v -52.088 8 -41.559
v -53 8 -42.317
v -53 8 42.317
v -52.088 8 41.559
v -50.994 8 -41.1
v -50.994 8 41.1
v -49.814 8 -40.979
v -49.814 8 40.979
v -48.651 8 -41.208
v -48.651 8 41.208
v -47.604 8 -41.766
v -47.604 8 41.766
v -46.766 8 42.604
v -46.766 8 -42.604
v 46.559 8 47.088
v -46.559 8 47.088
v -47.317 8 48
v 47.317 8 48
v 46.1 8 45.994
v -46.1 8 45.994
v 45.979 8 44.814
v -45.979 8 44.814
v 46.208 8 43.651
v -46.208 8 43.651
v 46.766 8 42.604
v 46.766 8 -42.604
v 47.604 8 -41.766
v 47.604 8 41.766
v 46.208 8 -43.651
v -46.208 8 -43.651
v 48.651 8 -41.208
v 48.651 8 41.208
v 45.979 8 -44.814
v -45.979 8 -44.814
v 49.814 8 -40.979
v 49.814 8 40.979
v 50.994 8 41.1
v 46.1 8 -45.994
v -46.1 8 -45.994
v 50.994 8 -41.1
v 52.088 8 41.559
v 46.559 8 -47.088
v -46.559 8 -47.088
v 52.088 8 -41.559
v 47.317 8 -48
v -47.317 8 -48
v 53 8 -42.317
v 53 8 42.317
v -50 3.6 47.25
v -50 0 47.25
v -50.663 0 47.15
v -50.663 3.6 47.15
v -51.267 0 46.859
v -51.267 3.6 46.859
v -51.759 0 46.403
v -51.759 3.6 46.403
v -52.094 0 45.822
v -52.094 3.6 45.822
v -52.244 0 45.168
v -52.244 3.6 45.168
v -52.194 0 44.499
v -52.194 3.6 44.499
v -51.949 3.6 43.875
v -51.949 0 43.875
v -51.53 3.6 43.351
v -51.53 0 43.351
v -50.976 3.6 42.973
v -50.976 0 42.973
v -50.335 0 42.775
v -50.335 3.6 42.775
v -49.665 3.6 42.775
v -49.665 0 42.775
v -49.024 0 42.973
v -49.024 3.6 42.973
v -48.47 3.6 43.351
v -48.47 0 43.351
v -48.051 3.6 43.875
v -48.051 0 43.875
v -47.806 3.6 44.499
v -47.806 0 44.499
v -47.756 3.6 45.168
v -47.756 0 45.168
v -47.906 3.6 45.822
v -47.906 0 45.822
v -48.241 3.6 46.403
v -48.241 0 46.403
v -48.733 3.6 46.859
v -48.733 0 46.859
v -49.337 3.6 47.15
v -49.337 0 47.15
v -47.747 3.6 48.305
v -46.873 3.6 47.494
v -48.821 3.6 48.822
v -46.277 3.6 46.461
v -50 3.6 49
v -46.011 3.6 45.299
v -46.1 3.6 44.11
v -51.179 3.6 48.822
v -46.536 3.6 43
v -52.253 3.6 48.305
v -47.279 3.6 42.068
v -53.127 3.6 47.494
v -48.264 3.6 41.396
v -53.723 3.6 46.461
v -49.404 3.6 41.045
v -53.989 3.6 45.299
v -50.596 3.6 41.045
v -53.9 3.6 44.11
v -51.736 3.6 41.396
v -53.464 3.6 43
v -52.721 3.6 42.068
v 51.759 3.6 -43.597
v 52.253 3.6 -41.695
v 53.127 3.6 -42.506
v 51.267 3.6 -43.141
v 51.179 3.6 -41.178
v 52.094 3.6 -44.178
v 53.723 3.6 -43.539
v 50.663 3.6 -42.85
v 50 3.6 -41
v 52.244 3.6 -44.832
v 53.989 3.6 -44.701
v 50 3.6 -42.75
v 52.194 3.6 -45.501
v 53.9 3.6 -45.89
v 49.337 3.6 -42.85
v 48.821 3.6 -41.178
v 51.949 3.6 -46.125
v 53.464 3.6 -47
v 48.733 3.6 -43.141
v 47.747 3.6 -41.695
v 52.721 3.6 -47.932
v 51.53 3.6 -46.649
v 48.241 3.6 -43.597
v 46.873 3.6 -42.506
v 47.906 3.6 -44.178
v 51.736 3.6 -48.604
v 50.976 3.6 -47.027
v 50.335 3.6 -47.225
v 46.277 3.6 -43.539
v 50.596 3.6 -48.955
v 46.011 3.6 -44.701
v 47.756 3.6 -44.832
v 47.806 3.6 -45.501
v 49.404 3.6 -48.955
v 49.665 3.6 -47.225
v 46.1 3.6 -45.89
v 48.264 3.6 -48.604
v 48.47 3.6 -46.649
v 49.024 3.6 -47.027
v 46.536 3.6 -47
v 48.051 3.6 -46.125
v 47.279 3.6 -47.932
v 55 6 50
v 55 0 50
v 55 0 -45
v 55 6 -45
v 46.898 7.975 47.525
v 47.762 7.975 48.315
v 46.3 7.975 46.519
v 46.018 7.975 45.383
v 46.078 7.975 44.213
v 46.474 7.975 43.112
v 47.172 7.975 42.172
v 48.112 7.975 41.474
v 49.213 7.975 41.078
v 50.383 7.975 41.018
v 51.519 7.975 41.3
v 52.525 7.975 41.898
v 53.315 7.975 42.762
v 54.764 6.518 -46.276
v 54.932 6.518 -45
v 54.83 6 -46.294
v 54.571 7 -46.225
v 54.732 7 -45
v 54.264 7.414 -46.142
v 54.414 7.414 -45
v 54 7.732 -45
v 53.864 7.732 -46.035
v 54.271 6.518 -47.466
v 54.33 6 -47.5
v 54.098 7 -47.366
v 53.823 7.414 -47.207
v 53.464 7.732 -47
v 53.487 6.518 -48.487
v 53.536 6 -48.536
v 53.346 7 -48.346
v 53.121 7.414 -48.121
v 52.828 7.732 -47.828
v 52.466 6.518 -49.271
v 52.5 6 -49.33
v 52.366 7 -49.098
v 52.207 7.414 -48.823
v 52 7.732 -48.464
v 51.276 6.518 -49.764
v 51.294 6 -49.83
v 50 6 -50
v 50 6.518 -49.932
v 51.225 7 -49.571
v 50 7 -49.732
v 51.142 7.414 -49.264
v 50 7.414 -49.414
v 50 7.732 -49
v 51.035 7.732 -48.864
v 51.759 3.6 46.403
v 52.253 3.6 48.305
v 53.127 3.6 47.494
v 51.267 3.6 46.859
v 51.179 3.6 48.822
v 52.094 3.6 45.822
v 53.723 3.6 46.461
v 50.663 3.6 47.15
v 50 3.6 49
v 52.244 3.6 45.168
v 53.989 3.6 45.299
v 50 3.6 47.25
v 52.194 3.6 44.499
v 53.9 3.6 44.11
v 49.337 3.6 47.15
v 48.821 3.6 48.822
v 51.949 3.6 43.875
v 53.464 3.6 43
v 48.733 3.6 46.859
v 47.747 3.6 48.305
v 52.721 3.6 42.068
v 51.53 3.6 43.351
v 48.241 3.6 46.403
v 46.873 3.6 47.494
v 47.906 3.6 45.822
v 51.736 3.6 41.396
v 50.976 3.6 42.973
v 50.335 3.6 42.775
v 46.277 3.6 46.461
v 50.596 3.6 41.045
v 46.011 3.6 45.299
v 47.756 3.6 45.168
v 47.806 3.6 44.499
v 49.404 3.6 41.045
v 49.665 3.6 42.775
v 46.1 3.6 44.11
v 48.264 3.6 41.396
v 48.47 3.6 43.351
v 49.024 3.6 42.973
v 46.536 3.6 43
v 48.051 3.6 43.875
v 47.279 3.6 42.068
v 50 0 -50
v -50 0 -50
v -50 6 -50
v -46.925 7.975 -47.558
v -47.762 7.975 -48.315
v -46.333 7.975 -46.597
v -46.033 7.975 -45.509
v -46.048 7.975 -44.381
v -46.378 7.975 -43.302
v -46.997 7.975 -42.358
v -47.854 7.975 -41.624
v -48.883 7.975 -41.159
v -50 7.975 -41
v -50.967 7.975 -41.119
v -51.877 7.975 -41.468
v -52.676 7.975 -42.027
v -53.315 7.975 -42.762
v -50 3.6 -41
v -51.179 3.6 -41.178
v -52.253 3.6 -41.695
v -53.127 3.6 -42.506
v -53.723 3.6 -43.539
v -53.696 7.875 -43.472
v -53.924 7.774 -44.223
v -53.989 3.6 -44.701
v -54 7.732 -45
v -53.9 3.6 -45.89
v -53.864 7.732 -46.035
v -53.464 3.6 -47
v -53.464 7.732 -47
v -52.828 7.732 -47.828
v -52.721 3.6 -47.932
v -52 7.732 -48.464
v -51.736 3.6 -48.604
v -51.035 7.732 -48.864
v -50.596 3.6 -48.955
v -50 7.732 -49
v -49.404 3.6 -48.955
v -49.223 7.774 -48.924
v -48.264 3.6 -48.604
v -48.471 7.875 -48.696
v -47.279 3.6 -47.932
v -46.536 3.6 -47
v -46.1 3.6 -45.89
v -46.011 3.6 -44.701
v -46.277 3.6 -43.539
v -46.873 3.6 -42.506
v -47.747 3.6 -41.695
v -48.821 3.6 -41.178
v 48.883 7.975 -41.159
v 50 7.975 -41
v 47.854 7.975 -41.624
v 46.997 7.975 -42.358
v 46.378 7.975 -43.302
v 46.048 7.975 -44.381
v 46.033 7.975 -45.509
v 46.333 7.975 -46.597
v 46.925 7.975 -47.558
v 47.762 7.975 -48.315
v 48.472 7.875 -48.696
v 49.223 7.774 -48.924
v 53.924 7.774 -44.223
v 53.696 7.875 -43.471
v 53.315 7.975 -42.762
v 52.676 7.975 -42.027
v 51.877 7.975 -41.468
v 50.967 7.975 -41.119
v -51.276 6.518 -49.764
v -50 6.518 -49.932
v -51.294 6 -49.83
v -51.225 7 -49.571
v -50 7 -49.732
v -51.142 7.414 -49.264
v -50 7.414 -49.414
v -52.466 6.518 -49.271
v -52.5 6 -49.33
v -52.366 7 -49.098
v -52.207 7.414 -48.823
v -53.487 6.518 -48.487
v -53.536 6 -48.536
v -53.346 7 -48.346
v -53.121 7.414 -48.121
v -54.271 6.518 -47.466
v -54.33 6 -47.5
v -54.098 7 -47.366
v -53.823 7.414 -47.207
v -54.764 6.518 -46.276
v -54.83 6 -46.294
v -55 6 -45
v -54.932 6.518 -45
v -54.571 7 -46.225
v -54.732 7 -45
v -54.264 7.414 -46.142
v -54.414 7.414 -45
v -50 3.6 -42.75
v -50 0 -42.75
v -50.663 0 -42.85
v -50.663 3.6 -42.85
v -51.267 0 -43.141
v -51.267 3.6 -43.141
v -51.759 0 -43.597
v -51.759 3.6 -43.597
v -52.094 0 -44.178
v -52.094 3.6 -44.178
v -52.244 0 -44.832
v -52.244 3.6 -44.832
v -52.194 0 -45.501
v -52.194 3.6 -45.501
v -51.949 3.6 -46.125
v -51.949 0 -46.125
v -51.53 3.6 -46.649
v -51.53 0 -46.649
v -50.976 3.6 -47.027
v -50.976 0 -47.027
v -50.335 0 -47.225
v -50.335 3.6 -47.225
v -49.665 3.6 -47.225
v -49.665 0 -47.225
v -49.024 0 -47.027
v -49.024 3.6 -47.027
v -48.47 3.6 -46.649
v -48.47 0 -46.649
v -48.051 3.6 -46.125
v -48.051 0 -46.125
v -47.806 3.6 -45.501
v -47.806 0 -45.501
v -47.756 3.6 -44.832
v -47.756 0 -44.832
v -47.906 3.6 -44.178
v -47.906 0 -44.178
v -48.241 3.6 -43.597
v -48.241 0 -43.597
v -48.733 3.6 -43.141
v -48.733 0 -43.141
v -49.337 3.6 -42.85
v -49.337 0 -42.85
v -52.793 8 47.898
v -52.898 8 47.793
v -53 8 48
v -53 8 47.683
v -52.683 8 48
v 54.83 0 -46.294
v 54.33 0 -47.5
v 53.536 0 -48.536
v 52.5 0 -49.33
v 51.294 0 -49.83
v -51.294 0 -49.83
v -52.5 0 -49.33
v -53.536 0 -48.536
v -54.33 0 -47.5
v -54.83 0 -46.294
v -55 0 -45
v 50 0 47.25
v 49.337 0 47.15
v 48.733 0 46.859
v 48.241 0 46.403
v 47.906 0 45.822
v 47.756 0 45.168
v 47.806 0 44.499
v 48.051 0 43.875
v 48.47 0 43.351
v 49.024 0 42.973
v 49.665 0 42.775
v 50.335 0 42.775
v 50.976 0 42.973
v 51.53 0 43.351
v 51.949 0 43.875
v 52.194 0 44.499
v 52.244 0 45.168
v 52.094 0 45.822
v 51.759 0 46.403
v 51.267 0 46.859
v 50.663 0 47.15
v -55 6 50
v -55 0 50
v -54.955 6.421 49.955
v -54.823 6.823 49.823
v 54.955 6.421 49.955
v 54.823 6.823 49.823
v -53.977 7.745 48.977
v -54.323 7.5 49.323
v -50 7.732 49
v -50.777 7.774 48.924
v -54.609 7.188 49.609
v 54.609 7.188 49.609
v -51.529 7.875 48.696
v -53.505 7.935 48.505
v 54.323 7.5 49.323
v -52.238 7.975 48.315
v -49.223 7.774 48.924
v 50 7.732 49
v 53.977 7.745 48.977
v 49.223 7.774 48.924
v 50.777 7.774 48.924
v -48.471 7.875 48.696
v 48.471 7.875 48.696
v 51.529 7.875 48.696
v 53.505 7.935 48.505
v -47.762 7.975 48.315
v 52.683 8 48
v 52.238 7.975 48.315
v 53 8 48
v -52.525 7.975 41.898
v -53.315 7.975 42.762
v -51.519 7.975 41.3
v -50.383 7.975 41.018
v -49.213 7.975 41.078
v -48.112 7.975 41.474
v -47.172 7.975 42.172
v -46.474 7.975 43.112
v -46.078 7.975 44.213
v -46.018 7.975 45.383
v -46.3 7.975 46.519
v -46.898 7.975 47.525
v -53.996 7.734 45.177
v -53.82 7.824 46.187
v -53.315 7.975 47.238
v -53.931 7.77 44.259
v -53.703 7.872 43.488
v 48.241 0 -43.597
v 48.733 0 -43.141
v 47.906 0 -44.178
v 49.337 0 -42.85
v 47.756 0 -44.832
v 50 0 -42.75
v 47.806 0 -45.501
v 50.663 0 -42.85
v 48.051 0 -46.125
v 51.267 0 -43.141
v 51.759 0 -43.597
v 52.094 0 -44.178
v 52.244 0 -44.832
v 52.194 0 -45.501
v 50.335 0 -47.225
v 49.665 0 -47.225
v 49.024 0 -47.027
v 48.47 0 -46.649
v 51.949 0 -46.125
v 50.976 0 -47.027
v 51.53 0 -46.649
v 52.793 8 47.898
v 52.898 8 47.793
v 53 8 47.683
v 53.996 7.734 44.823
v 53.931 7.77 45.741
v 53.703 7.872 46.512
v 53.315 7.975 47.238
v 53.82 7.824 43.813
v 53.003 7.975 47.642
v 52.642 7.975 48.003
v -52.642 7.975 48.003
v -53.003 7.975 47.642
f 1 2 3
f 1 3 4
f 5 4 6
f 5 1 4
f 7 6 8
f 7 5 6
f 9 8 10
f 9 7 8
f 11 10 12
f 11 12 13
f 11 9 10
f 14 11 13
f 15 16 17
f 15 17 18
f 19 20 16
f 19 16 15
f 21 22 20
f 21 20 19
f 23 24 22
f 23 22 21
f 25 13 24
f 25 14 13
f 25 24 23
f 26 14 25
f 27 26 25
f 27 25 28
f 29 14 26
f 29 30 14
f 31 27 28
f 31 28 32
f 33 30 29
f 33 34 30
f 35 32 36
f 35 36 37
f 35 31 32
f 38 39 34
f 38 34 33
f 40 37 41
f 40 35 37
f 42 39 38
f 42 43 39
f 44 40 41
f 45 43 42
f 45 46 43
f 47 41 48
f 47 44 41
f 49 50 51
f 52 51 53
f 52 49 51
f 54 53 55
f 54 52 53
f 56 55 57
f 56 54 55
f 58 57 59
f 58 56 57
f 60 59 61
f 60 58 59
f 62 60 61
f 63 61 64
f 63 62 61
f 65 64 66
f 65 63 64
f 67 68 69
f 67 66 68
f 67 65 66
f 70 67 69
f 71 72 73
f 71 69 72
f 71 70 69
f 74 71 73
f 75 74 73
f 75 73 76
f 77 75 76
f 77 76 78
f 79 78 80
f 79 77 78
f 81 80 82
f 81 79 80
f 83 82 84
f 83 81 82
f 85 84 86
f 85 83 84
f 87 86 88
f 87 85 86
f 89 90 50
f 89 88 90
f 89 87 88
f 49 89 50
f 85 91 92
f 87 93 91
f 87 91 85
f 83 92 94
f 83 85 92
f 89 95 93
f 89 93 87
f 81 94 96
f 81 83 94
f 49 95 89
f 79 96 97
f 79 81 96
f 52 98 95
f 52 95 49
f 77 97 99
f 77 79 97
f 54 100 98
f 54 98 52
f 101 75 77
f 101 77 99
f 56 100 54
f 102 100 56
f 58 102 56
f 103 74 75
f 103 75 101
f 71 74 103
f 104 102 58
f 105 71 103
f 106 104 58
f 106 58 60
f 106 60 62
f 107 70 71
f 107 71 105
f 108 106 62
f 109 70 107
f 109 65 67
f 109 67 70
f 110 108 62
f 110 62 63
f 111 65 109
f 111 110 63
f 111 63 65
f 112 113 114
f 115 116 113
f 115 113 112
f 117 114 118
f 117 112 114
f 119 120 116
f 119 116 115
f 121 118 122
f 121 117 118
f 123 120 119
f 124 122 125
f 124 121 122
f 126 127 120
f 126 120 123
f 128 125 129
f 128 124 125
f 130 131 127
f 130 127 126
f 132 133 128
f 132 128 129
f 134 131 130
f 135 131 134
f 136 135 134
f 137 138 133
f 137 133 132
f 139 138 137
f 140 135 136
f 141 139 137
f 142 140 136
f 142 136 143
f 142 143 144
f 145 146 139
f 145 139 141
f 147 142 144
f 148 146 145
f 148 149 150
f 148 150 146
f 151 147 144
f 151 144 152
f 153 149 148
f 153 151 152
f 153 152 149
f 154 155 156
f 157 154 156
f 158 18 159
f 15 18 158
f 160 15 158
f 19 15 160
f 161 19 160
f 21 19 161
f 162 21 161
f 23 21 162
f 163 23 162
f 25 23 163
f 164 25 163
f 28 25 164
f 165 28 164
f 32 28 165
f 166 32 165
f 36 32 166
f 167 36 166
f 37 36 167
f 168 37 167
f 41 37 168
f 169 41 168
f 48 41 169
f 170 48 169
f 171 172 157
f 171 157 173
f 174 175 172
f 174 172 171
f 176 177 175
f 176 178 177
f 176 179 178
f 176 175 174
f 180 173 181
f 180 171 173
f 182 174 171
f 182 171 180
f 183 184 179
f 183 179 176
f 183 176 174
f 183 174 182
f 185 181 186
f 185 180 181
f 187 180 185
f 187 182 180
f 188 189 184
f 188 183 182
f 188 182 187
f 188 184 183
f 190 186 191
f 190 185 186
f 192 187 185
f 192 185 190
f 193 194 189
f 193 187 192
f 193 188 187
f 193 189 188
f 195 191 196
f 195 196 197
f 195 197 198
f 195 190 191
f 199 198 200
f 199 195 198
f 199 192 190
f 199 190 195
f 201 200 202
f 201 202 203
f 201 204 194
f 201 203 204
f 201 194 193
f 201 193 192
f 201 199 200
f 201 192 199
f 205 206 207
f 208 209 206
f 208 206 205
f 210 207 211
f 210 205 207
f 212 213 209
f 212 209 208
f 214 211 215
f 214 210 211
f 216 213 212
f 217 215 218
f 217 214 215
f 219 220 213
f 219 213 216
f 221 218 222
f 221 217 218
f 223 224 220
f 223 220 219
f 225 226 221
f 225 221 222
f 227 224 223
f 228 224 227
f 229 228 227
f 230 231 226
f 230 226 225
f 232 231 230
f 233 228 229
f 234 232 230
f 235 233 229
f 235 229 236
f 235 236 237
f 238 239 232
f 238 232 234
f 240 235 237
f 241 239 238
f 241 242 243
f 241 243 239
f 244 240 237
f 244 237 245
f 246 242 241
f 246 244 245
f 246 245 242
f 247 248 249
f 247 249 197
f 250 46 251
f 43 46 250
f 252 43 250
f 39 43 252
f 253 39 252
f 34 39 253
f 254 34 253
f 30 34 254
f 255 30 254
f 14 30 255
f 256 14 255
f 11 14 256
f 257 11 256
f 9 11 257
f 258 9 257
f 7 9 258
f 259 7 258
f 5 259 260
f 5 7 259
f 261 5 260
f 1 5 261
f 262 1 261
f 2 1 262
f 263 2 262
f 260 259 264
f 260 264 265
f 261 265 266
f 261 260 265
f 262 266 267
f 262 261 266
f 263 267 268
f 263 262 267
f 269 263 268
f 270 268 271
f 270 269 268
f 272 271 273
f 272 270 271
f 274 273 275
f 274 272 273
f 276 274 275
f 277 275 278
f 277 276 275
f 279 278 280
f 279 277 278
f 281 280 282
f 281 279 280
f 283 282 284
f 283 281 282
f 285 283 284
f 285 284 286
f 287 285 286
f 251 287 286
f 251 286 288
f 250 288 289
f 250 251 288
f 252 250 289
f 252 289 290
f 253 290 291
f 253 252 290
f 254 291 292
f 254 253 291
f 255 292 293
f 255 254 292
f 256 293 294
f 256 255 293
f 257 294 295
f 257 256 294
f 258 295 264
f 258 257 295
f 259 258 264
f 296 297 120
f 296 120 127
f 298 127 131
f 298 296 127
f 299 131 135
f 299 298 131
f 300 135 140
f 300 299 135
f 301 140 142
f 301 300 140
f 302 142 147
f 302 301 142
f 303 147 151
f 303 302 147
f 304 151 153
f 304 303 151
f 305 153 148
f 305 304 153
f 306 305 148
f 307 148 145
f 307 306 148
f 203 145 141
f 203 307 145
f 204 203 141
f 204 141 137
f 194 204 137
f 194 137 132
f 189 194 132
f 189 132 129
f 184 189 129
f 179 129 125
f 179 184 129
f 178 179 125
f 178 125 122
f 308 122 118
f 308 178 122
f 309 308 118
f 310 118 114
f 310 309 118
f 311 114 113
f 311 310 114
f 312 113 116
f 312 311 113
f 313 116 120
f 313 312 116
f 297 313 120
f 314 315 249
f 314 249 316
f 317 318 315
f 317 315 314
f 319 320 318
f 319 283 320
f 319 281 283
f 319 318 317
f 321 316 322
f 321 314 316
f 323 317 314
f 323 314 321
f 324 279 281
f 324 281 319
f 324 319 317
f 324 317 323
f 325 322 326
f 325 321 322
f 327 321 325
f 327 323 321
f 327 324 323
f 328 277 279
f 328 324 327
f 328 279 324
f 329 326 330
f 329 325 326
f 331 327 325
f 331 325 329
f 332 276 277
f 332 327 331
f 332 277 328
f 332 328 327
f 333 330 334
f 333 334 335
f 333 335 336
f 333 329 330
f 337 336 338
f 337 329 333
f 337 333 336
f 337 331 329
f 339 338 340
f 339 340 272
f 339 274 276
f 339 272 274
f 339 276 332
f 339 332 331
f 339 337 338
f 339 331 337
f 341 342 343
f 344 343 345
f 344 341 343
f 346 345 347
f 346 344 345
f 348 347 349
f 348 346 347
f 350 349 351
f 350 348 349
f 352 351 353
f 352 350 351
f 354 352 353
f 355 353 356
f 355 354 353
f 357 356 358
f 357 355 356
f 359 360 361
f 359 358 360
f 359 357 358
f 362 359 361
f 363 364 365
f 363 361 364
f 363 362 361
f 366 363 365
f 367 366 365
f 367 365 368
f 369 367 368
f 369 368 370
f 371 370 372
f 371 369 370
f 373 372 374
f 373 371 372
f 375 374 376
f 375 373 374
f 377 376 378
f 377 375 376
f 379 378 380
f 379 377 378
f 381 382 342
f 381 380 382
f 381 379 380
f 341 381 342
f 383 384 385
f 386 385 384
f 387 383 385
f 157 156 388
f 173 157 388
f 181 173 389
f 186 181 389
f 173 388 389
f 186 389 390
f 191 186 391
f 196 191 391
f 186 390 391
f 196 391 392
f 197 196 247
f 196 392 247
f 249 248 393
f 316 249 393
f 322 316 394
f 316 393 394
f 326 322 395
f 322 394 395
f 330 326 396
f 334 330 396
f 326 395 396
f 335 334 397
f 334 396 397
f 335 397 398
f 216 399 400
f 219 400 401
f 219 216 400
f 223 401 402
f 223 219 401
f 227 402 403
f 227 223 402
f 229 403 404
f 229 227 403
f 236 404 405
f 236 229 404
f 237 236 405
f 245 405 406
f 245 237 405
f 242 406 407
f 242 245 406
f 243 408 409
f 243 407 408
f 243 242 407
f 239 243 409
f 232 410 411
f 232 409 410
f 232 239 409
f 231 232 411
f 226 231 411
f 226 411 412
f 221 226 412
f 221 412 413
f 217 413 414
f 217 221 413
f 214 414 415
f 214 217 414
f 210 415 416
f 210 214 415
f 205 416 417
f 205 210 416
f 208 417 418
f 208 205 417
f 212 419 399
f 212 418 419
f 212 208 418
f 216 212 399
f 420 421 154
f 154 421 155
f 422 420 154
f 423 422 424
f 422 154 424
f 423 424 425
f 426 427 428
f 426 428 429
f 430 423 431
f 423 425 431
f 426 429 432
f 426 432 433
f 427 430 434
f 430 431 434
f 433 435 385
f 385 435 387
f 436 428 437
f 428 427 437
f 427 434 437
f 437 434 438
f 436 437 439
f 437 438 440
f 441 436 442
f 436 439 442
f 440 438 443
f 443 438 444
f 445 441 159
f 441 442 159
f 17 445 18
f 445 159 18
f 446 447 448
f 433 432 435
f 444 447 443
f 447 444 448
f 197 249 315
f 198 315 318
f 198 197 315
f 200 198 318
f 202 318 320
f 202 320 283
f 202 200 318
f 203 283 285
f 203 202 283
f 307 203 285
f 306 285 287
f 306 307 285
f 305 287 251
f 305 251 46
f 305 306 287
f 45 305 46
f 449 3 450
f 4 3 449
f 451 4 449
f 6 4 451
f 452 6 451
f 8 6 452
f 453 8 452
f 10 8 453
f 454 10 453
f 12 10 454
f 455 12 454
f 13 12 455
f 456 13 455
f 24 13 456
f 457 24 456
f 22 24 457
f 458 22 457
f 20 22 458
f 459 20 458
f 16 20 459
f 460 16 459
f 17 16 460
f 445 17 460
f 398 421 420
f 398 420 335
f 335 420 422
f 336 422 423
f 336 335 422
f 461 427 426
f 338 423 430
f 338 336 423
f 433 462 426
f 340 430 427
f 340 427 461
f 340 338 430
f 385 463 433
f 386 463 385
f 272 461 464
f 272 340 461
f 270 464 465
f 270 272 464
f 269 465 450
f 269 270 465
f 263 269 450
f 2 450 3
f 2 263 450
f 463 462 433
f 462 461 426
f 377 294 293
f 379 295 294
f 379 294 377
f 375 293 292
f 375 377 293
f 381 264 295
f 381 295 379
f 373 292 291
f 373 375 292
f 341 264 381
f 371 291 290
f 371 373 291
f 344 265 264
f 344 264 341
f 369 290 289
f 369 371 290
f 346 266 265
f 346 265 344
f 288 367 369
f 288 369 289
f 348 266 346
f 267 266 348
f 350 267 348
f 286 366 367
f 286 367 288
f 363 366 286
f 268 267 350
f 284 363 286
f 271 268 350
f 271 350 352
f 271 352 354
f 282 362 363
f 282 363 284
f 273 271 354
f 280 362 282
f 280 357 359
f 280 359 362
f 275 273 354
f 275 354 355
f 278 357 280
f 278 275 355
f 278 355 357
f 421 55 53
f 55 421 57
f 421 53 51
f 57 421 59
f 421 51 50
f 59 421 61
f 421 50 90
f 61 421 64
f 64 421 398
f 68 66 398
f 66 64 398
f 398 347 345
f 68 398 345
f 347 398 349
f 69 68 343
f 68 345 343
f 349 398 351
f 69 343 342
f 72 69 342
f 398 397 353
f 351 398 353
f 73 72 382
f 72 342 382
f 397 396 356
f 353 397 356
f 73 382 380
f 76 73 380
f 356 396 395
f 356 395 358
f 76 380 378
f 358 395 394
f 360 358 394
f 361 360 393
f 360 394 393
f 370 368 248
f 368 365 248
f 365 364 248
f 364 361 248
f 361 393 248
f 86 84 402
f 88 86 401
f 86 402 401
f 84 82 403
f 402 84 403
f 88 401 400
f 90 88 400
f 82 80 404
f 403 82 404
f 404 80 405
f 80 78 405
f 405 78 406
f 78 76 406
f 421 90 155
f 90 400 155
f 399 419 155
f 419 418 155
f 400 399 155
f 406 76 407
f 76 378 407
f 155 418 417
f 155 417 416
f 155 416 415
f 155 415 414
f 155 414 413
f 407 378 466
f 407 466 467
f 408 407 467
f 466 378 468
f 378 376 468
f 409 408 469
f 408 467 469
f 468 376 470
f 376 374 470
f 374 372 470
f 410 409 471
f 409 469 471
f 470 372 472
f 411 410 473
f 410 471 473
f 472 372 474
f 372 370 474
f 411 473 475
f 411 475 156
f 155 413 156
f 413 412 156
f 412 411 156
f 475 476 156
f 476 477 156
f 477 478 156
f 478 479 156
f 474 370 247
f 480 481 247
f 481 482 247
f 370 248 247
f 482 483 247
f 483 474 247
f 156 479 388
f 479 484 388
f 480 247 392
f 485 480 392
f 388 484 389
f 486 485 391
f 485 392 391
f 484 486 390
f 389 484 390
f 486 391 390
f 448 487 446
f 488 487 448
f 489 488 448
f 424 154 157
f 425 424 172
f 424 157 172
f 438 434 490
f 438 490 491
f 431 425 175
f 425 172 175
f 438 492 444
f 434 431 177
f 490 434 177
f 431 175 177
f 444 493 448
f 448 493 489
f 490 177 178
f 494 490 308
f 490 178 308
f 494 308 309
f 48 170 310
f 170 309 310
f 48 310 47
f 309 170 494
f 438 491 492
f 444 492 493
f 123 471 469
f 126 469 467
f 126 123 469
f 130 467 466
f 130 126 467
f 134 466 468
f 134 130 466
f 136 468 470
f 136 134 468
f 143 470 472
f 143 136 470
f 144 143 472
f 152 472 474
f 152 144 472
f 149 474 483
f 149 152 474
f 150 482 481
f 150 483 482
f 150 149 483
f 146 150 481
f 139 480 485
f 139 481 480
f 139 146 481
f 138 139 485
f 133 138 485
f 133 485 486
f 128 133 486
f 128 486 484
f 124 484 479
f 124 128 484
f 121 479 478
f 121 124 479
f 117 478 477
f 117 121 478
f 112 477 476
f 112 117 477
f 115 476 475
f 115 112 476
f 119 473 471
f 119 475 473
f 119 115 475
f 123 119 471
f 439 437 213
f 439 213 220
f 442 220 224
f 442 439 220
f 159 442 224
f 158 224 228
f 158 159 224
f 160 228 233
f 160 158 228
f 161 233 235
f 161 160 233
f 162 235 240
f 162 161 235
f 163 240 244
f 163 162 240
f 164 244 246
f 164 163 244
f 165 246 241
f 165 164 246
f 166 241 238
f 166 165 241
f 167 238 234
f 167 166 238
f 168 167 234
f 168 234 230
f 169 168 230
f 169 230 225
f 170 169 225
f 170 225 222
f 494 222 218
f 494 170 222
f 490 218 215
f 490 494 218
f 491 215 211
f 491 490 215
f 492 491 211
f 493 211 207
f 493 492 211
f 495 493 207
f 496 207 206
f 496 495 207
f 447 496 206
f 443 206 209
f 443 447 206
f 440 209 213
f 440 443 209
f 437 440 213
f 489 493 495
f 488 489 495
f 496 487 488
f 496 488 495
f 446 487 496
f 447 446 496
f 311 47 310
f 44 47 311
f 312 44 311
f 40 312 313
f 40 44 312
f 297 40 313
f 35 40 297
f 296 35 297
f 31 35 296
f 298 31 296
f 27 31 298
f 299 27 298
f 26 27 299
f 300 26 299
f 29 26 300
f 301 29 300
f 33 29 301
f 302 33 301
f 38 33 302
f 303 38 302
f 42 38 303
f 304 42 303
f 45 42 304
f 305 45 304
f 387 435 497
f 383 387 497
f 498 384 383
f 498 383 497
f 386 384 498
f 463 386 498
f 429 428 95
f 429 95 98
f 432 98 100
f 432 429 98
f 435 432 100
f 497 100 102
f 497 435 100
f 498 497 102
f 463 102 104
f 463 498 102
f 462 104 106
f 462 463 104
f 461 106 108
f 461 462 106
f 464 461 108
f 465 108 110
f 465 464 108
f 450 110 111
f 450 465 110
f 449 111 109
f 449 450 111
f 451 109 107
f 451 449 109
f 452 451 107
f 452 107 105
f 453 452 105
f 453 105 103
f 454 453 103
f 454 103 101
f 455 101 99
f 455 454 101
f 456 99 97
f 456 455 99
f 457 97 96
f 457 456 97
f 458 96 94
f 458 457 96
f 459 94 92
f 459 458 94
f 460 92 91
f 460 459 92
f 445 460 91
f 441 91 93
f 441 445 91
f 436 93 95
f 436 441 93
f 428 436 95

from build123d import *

# Parameters (mm, degrees)
SKETCH2_W                                    = 110
SKETCH2_H                                    = 100
BOSS_EXTRUDE1_DEPTH                          = 8
FILLET2_R                                    = 2
FILLET3_R                                    = 5
CBORE_FOR_M4_HEX_SOCKET_HEAD_CAP_SCR_2_COUNT = 2
CBORE_FOR_M4_HEX_SOCKET_HEAD_CAP_SCR_2_PITCH = 100
CBORE_FOR_M4_HEX_SOCKET_HEAD_CAP_SCR_3_COUNT = 2
CBORE_FOR_M4_HEX_SOCKET_HEAD_CAP_SCR_3_PITCH = 134.536240471
CBORE_FOR_M4_HEX_SOCKET_HEAD_CAP_SCR_4_COUNT = 2
CBORE_FOR_M4_HEX_SOCKET_HEAD_CAP_SCR_4_PITCH = 90


with BuildPart() as part:
    # Sketch2 → Boss-Extrude1 (new body)
    with BuildSketch(Plane(origin=(0, 0, 0), x_dir=(1, 0, 0), z_dir=(0, 1, 0))):
        Rectangle(SKETCH2_W, SKETCH2_H)
    extrude(amount=BOSS_EXTRUDE1_DEPTH)

    # Fillet2
    fillet2_edges = [part.edges().sort_by_distance(p)[0] for p in [
        (-55, 8, 0),
        (0, 8, 50),
        (55, 8, 0),
        (0, 8, -50),
    ]]
    fillet(fillet2_edges, radius=FILLET2_R)

    # Fillet3
    # the kernel refuses this fillet: 5 mm, written as the material it takes off along each edge
    with BuildSketch(Plane(origin=(-50, 8, -45), x_dir=(0, 0, -1), z_dir=(1, 0, 0))) as fillet3_piece_1:
        with BuildLine():
            CenterArc((3, -2), 2, 0, 90)
            Line((5, -2), (5, 0))
            Line((5, 0), (3, 0))
        make_face()
    revolve(axis=Axis((-50, 8, -45), (0, 1, 0)), revolution_arc=90, mode=Mode.SUBTRACT)
    with BuildSketch(Plane(origin=(50, 8, -45), x_dir=(1, 0, 0), z_dir=(0, 0, 1))) as fillet3_piece_2:
        with BuildLine():
            CenterArc((3, -2), 2, 0, 90)
            Line((5, -2), (5, 0))
            Line((5, 0), (3, 0))
        make_face()
    revolve(axis=Axis((50, 8, -45), (0, 1, 0)), revolution_arc=90, mode=Mode.SUBTRACT)
    with BuildSketch(Plane(origin=(-55, -12.5, -50), x_dir=(1, 0, 0), z_dir=(0, 1, 0))) as fillet3_piece_3:
        with BuildLine():
            CenterArc((FILLET3_R, -FILLET3_R), FILLET3_R, 90, 90)
            Line((0, -FILLET3_R), (0, 0))
            Line((0, 0), (FILLET3_R, 0))
        make_face()
    extrude(amount=20.5, mode=Mode.SUBTRACT)
    with BuildSketch(Plane(origin=(55, -12.5, -50), x_dir=(-1, 0, 0), z_dir=(0, 1, 0))) as fillet3_piece_4:
        with BuildLine():
            CenterArc((FILLET3_R, FILLET3_R), FILLET3_R, 180, 90)
            Line((0, FILLET3_R), (0, 0))
            Line((0, 0), (FILLET3_R, 0))
        make_face()
    extrude(amount=20.5, mode=Mode.SUBTRACT)

    # Sketch4 → CBORE for M4 Hex Socket Head Cap Screw1 (revolve, cut)
    with BuildSketch(Plane(origin=(50, 8, -45), x_dir=(0, 0, 1), z_dir=(1, 0, 0))):
        Polygon((0, 0), (0, 11.451936393), (2.25, 10.1), (2.25, 4.4), (4, 4.4), (4, 0.025), (4.025, 0), align=None)
    cbore_for_m4_hex_socket_head_cap_screw1 = revolve(axis=Axis((50, 14.35, -45), (0, -1, 0)), mode=Mode.SUBTRACT)

    # CBORE for M4 Hex Socket Head Cap Scr 2: CBORE for M4 Hex Socket Head Cap Screw1 ×2
    with Locations(*[(-i * CBORE_FOR_M4_HEX_SOCKET_HEAD_CAP_SCR_2_PITCH, 0, 0) for i in range(1, CBORE_FOR_M4_HEX_SOCKET_HEAD_CAP_SCR_2_COUNT)]):
        add(cbore_for_m4_hex_socket_head_cap_screw1, mode=Mode.SUBTRACT)

    # CBORE for M4 Hex Socket Head Cap Scr 3: CBORE for M4 Hex Socket Head Cap Screw1 ×2
    with Locations(*[Vector(-0.7432941462471664, 0, 0.6689647316224497) * (i * CBORE_FOR_M4_HEX_SOCKET_HEAD_CAP_SCR_3_PITCH) for i in range(1, CBORE_FOR_M4_HEX_SOCKET_HEAD_CAP_SCR_3_COUNT)]):
        add(cbore_for_m4_hex_socket_head_cap_screw1, mode=Mode.SUBTRACT)

    # CBORE for M4 Hex Socket Head Cap Scr 4: CBORE for M4 Hex Socket Head Cap Screw1 ×2
    with Locations(*[(0, 0, i * CBORE_FOR_M4_HEX_SOCKET_HEAD_CAP_SCR_4_PITCH) for i in range(1, CBORE_FOR_M4_HEX_SOCKET_HEAD_CAP_SCR_4_COUNT)]):
        add(cbore_for_m4_hex_socket_head_cap_screw1, mode=Mode.SUBTRACT)


solid = part.part
